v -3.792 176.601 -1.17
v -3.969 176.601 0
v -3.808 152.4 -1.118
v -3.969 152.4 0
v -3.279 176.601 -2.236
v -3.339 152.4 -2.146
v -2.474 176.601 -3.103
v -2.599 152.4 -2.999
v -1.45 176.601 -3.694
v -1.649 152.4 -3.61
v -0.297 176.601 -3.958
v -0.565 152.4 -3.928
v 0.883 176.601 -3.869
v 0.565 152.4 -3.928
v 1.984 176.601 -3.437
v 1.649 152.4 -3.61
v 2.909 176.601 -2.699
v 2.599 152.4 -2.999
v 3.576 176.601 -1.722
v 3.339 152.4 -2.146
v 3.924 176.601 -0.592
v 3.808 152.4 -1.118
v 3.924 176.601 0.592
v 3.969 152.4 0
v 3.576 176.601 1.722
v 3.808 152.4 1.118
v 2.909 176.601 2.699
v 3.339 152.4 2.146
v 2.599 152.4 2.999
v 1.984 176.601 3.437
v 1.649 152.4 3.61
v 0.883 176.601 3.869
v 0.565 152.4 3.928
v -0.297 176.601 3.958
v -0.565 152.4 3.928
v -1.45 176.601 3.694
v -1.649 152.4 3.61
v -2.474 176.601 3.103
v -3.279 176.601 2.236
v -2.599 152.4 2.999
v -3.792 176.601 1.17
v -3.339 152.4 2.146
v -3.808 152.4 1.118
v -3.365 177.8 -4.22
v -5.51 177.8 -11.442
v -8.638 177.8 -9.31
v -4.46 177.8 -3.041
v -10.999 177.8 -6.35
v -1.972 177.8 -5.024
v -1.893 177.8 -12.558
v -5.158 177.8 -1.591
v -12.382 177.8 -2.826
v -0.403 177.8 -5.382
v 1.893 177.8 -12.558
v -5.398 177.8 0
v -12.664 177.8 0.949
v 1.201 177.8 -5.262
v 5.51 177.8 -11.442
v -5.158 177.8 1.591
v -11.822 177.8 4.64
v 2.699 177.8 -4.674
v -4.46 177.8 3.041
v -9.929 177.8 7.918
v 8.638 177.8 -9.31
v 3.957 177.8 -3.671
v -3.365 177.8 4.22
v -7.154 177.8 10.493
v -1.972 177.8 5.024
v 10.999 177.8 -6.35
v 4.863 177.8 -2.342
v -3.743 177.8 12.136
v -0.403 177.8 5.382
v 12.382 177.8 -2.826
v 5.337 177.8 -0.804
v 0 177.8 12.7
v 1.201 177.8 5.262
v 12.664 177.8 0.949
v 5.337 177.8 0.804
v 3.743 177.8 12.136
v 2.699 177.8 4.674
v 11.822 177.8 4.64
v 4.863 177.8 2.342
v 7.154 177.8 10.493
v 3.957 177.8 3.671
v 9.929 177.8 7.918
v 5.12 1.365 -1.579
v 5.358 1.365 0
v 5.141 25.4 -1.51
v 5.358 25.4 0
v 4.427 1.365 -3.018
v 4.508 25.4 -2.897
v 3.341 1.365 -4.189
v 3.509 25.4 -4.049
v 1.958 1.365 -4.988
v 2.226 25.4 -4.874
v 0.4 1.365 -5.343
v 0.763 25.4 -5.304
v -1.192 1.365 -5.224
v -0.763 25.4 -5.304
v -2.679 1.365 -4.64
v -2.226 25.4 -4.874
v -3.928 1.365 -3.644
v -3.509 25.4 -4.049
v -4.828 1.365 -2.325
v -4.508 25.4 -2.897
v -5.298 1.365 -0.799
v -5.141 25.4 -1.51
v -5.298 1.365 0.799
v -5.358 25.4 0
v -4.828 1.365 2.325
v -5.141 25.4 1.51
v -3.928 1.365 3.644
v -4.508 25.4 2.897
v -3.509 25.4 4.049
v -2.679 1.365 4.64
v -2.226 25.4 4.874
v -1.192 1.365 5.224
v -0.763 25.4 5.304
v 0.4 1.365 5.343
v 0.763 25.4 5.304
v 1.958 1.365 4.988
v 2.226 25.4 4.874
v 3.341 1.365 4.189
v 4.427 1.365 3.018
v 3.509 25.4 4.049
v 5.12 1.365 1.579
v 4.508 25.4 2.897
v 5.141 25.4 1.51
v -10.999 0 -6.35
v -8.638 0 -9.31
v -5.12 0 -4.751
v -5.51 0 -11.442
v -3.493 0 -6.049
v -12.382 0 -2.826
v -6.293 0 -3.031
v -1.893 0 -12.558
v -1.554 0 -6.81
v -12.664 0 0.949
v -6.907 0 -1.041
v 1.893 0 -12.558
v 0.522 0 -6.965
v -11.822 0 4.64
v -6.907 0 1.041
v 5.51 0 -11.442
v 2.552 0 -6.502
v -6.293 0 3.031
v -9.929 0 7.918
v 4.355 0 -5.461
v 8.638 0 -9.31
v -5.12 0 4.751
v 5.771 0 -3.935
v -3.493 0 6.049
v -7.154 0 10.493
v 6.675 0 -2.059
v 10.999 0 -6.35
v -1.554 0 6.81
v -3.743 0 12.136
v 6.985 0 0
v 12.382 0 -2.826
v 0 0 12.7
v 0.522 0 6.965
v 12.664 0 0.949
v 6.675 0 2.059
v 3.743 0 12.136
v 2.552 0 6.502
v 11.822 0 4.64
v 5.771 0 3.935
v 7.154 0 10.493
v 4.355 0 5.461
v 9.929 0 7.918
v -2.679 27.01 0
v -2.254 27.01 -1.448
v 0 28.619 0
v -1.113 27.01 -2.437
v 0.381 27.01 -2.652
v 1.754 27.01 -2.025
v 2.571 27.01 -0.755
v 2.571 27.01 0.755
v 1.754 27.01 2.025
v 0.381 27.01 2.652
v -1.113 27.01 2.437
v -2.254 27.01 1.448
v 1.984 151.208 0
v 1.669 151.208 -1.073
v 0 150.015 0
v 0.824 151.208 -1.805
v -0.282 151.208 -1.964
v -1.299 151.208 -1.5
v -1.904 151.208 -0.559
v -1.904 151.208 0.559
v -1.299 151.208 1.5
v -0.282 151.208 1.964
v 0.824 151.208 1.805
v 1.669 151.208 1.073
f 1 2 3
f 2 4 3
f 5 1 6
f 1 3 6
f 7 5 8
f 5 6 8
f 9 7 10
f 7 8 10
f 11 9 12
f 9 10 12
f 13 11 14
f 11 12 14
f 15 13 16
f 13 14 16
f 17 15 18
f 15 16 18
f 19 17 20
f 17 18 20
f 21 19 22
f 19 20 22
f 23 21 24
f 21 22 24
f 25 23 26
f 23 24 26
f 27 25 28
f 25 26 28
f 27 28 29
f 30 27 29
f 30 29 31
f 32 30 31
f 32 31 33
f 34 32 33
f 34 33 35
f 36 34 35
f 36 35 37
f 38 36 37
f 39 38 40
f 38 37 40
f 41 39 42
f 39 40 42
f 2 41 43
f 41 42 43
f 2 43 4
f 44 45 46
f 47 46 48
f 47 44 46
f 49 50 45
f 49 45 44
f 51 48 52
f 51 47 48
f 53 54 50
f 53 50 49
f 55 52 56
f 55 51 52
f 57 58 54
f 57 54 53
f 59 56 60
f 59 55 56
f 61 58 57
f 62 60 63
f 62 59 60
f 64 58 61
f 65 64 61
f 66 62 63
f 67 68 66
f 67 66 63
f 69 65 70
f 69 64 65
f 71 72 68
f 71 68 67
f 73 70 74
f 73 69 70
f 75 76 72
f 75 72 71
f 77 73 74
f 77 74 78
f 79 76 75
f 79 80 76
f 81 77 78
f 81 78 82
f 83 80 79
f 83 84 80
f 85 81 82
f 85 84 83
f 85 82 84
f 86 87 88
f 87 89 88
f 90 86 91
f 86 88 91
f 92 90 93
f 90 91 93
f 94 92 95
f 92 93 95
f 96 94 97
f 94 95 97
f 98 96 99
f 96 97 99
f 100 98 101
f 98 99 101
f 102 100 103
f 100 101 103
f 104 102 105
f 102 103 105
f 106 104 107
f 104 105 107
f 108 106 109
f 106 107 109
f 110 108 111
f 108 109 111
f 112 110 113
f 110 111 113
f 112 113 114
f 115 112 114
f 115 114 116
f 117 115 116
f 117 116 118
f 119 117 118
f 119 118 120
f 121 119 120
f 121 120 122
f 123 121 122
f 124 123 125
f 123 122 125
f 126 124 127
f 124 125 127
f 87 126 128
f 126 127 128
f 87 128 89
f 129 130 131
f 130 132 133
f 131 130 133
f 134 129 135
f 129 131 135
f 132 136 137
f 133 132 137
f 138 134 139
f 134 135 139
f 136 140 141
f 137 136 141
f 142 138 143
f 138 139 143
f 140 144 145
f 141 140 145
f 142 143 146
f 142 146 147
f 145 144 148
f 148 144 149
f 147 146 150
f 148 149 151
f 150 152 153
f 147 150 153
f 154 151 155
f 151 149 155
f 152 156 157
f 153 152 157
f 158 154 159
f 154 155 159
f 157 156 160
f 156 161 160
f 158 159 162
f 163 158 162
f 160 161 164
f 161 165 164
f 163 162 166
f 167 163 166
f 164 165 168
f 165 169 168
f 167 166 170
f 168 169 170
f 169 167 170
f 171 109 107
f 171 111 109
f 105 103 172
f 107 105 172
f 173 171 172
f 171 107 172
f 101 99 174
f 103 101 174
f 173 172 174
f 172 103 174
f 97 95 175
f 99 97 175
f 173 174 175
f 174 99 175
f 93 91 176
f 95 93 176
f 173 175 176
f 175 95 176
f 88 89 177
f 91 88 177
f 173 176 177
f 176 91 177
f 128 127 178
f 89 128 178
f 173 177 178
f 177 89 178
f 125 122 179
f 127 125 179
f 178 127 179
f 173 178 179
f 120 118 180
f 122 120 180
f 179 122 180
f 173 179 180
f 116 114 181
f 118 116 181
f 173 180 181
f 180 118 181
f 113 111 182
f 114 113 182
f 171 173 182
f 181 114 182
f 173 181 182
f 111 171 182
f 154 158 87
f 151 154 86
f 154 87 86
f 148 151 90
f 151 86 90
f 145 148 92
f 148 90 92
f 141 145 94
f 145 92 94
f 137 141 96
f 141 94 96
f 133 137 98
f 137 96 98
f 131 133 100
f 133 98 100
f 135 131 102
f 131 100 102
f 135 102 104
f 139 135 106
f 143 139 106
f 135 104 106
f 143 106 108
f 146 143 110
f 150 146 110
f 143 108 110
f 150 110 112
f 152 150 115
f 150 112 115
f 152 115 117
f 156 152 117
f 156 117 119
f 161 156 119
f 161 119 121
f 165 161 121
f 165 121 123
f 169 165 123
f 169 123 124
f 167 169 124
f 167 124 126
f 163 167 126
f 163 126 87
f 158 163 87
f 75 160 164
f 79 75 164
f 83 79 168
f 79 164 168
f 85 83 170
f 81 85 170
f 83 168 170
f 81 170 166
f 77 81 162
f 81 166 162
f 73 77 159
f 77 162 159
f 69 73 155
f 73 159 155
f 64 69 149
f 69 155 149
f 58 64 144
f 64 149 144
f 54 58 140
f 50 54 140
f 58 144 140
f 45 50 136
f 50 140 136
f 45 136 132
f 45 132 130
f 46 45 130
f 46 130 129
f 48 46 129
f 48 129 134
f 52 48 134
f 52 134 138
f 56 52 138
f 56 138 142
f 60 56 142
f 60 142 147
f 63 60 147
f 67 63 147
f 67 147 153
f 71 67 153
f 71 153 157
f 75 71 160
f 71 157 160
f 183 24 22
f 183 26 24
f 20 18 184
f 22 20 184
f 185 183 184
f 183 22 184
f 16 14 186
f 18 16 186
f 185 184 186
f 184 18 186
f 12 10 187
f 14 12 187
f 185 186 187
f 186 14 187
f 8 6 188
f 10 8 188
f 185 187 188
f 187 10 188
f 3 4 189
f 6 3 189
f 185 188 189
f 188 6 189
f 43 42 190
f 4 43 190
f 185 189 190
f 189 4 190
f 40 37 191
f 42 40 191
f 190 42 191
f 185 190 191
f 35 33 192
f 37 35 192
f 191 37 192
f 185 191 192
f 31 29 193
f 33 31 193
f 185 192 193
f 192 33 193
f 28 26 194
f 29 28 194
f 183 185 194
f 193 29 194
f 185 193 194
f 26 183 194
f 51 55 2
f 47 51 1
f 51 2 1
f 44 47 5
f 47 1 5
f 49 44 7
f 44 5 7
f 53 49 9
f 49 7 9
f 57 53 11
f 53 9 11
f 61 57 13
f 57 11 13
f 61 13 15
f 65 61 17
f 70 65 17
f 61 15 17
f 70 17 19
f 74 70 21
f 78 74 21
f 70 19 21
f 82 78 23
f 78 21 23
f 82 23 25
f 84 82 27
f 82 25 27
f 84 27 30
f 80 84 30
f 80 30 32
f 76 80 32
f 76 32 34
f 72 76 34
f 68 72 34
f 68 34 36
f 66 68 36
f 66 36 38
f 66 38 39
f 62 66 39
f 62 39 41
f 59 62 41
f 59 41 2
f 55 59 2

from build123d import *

# Parameters (mm, degrees)
SKETCH1_R                         = 12.7
BOSS_EXTRUDE1_DEPTH               = 177.8
F_1_2_13_TAPPED_HOLE1_D           = 10.71626
F_1_2_13_TAPPED_HOLE1_DEPTH       = 25.4
F_1_2_13_TAPPED_HOLE1_CSINK_D     = 13.97
F_1_2_13_TAPPED_HOLE1_CSINK_ANGLE = 100
F_1_2_13_TAPPED_HOLE1_TIP         = 3.219489309
F_3_8_16_TAPPED_HOLE1_D           = 7.9375
F_3_8_16_TAPPED_HOLE1_DEPTH       = 25.4
F_3_8_16_TAPPED_HOLE1_CSINK_D     = 10.795
F_3_8_16_TAPPED_HOLE1_CSINK_ANGLE = 100
F_3_8_16_TAPPED_HOLE1_TIP         = 2.384665582


with BuildPart() as part:
    # Sketch1 → Boss-Extrude1 (new body)
    with BuildSketch(Plane(origin=(0, 0, 0), x_dir=(1, 0, 0), z_dir=(0, 1, 0))):
        with Locations(Location((0, 0, 0), (0, 0, 270))):
            Circle(SKETCH1_R)
    extrude(amount=BOSS_EXTRUDE1_DEPTH)

    # 1/2-13 Tapped Hole1
    with Locations(Plane(origin=(0, 0, 0), x_dir=(-1, 0, 0), z_dir=(0, -1, 0))):
        with Locations((0, 0)):
            CounterSinkHole(F_1_2_13_TAPPED_HOLE1_D / 2, F_1_2_13_TAPPED_HOLE1_CSINK_D / 2, depth=F_1_2_13_TAPPED_HOLE1_DEPTH, counter_sink_angle=F_1_2_13_TAPPED_HOLE1_CSINK_ANGLE)
            with Locations((0, 0, -(F_1_2_13_TAPPED_HOLE1_DEPTH + F_1_2_13_TAPPED_HOLE1_TIP / 2))):  # 118° drill point
                Cone(0, F_1_2_13_TAPPED_HOLE1_D / 2, F_1_2_13_TAPPED_HOLE1_TIP, mode=Mode.SUBTRACT)

    # 3/8-16 Tapped Hole1
    with Locations(Plane(origin=(0, 177.8, 0), x_dir=(1, 0, 0), z_dir=(0, 1, 0))):
        with Locations((0, 0)):
            CounterSinkHole(F_3_8_16_TAPPED_HOLE1_D / 2, F_3_8_16_TAPPED_HOLE1_CSINK_D / 2, depth=F_3_8_16_TAPPED_HOLE1_DEPTH, counter_sink_angle=F_3_8_16_TAPPED_HOLE1_CSINK_ANGLE)
            with Locations((0, 0, -(F_3_8_16_TAPPED_HOLE1_DEPTH + F_3_8_16_TAPPED_HOLE1_TIP / 2))):  # 118° drill point
                Cone(0, F_3_8_16_TAPPED_HOLE1_D / 2, F_3_8_16_TAPPED_HOLE1_TIP, mode=Mode.SUBTRACT)


solid = part.part
